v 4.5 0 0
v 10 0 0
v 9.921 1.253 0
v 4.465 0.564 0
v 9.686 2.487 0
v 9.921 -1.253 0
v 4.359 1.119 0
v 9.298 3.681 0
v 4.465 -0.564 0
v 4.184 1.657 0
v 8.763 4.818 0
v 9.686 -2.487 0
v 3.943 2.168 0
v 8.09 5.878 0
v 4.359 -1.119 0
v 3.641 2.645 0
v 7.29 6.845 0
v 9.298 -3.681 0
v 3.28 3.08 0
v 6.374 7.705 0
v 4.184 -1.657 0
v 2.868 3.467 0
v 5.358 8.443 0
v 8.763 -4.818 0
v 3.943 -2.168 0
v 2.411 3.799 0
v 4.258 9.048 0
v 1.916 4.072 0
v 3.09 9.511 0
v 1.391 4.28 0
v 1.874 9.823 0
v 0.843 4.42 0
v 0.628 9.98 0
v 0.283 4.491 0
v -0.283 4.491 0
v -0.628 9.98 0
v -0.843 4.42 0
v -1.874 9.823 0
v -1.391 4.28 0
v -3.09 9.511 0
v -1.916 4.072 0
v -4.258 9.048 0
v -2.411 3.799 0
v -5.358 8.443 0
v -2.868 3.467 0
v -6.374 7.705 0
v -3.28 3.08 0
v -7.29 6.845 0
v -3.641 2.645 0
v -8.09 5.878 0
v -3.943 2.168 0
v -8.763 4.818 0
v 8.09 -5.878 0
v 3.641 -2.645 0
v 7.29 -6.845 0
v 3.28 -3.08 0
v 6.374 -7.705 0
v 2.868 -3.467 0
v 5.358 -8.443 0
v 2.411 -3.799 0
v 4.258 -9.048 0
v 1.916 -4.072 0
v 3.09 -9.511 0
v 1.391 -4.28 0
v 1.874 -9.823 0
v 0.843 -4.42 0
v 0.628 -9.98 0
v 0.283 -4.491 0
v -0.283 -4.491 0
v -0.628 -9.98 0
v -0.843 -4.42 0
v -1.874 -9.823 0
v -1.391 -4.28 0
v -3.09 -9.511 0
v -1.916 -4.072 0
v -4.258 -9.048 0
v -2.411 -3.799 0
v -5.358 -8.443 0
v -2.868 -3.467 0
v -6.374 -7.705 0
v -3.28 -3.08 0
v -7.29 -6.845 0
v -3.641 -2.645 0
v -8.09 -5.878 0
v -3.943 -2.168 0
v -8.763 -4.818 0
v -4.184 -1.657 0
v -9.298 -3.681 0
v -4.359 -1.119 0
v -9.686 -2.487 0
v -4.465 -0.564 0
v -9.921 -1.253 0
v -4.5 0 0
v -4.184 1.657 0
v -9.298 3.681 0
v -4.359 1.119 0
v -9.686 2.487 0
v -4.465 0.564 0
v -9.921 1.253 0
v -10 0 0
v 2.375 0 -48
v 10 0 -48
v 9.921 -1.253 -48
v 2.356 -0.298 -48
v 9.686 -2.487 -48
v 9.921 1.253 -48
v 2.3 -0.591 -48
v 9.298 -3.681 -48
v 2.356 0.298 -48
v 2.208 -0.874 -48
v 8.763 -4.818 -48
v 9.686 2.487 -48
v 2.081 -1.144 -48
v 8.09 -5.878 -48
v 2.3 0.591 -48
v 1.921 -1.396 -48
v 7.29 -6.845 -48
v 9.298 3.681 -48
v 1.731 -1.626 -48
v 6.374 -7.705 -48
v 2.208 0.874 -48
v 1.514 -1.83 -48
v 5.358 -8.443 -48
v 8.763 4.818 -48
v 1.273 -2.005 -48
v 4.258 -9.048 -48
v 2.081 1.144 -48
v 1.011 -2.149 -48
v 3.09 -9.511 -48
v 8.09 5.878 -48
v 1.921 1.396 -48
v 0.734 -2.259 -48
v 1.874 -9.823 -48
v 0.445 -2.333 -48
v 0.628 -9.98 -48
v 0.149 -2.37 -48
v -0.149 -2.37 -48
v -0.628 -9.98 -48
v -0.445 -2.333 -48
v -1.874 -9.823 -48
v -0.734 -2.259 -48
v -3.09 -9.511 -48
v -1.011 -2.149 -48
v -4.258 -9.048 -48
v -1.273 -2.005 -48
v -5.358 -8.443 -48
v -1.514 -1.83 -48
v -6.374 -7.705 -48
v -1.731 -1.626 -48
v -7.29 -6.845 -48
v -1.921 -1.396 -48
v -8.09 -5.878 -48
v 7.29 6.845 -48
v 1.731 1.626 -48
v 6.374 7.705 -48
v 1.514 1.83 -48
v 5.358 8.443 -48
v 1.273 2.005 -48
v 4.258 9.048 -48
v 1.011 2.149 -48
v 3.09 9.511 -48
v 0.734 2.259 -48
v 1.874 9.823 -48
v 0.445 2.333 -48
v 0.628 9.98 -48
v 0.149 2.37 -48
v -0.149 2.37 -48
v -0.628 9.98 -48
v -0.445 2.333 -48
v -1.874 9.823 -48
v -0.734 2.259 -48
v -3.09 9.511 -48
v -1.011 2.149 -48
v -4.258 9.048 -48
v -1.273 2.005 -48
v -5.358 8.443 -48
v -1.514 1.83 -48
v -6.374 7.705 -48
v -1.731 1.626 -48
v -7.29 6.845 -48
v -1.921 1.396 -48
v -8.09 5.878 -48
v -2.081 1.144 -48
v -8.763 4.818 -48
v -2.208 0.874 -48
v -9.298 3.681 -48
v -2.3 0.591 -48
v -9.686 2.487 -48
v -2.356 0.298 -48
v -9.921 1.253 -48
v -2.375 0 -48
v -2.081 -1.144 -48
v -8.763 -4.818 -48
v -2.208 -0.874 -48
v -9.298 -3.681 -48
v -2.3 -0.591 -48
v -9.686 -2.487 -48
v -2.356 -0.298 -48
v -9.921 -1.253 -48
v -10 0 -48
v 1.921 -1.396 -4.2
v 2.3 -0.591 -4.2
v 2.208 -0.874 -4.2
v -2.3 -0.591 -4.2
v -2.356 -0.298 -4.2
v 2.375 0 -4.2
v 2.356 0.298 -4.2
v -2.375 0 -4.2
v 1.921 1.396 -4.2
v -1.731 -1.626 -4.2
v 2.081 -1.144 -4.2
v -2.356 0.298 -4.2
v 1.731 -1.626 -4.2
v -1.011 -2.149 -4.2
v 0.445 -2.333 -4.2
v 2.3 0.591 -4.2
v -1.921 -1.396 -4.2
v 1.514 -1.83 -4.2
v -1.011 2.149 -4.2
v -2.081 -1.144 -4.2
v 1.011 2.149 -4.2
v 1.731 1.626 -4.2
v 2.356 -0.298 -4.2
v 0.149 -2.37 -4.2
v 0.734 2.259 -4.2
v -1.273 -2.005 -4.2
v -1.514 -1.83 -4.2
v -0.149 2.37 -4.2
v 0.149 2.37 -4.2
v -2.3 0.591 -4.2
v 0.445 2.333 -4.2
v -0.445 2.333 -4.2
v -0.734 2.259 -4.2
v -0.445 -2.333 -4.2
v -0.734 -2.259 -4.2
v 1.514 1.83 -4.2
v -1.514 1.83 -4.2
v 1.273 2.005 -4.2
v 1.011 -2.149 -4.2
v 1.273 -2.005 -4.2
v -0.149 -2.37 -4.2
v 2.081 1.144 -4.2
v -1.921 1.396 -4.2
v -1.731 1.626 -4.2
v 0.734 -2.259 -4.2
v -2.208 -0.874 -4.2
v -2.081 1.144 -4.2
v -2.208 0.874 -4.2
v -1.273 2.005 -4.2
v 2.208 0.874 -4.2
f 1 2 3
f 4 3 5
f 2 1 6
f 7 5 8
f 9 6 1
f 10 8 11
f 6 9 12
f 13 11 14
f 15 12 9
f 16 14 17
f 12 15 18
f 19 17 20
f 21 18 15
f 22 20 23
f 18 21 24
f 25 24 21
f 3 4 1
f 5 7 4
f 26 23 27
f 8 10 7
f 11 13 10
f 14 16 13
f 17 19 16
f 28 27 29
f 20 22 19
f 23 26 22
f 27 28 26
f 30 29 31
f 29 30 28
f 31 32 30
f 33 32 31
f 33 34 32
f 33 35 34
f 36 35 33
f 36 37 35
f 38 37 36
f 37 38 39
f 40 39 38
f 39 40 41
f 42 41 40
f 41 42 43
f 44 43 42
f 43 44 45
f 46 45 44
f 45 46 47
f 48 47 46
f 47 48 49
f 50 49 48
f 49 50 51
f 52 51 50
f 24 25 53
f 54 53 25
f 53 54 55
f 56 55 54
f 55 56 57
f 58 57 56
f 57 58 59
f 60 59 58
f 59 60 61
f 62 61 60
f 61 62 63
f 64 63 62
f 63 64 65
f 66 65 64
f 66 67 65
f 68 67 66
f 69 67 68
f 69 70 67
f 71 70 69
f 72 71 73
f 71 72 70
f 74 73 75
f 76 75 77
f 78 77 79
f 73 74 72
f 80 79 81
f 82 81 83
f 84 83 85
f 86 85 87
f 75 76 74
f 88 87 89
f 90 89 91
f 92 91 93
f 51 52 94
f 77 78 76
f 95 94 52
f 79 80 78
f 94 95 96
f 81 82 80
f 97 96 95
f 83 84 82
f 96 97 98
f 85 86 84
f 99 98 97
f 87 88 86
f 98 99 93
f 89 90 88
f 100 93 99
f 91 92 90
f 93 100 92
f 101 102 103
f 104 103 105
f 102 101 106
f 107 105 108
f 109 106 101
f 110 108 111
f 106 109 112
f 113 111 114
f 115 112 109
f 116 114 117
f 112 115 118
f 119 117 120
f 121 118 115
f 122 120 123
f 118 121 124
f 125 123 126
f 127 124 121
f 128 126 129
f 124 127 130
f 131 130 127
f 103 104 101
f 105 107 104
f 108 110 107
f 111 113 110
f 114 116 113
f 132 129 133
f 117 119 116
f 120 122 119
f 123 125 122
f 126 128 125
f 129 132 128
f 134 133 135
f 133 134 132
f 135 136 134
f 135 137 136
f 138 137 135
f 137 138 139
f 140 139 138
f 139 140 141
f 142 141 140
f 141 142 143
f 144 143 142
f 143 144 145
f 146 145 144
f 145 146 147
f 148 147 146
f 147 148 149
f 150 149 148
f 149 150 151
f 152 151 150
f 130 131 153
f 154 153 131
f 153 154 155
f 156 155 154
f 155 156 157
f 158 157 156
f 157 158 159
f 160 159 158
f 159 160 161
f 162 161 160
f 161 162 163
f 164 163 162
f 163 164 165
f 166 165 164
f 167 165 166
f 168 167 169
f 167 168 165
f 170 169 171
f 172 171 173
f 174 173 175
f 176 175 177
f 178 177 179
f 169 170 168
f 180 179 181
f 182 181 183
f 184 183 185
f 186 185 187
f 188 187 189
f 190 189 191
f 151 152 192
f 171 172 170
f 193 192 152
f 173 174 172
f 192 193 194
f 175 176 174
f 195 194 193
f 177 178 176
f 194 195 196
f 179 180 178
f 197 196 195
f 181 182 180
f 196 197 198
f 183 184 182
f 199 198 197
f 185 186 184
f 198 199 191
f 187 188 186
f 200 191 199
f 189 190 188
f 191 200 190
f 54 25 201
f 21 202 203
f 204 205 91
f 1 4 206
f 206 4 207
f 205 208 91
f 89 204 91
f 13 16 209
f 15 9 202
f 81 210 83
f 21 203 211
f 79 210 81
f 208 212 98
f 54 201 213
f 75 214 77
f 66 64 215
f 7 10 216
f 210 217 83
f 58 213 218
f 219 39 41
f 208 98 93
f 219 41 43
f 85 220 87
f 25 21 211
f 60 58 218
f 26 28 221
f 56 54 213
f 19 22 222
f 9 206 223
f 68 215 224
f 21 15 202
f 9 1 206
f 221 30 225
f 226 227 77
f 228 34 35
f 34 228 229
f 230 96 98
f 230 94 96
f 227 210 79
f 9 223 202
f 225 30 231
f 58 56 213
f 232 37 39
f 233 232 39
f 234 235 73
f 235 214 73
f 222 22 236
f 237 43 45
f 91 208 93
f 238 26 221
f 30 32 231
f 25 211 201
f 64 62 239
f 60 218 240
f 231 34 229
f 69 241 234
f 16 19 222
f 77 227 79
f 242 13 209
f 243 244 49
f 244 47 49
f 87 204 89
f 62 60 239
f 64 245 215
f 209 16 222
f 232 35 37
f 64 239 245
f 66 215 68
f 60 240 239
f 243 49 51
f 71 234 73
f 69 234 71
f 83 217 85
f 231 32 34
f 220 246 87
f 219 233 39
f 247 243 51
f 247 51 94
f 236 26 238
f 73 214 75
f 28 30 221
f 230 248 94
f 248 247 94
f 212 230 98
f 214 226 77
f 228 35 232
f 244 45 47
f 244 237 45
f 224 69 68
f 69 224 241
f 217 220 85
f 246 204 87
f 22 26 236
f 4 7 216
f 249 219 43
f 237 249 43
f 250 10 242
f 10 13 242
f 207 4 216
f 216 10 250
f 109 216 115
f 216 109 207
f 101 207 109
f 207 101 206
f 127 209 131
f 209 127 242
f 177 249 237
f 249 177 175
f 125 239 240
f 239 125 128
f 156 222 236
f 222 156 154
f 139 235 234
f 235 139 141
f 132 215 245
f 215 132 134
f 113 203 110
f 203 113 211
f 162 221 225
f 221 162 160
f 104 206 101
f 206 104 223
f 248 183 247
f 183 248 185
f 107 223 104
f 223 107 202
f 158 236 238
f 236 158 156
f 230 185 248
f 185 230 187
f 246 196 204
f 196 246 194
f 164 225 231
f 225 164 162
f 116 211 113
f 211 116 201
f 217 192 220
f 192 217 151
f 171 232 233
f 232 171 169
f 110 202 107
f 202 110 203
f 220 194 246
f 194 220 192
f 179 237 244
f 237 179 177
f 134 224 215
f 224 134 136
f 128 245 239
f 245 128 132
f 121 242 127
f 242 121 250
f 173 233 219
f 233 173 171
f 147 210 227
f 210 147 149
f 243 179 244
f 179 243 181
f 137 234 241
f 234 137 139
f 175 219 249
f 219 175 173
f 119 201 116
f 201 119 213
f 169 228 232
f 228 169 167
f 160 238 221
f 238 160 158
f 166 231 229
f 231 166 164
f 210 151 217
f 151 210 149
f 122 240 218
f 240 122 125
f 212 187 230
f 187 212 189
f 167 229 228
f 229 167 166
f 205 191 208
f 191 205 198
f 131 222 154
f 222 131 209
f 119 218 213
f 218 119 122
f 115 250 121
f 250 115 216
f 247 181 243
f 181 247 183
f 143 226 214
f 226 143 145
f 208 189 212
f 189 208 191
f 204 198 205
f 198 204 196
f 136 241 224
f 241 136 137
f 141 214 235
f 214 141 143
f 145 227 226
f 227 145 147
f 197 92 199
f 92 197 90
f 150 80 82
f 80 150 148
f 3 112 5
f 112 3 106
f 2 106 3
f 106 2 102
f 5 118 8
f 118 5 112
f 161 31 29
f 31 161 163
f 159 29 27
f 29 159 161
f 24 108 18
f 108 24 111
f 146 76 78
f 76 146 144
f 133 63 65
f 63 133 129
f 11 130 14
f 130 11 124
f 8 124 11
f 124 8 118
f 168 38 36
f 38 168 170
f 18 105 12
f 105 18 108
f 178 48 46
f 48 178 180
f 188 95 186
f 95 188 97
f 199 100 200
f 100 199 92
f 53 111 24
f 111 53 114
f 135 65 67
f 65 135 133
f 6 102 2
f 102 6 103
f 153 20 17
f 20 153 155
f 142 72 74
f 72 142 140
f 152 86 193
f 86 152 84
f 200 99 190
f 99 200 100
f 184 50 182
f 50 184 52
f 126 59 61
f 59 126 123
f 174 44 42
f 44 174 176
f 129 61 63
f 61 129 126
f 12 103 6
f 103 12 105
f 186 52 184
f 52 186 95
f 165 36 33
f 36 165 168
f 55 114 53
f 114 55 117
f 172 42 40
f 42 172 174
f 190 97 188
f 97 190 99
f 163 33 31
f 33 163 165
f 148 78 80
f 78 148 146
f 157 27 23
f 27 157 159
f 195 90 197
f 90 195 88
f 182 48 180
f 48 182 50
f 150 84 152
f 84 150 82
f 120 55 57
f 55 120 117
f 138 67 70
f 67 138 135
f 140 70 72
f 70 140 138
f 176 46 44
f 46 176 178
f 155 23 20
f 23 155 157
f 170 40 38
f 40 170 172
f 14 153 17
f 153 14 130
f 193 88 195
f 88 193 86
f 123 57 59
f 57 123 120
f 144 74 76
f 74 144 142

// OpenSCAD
$fn = 50;


difference() {
	union() {
		translate(v = [0, 0, -48.0000000000]) {
			cylinder(h = 48, r = 10.0000000000);
		}
		cylinder(h = 0, r = 16.0000000000);
	}
	union() {
		translate(v = [0, 0, 0]) {
			rotate(a = [0, 0, 0]) {
				difference() {
					union() {
						#translate(v = [0, 0, -48.0000000000]) {
							cylinder(h = 48, r = 2.2500000000);
						}
						#translate(v = [0, 0, -4.2000000000]) {
							cylinder(h = 4.2000000000, r1 = 2.3750000000, r2 = 4.5000000000);
						}
						#translate(v = [0, 0, -48.0000000000]) {
							cylinder(h = 48, r = 2.3750000000);
						}
						#translate(v = [0, 0, -48.0000000000]) {
							cylinder(h = 48, r = 2.2500000000);
						}
					}
					union();
				}
			}
		}
	}
}
